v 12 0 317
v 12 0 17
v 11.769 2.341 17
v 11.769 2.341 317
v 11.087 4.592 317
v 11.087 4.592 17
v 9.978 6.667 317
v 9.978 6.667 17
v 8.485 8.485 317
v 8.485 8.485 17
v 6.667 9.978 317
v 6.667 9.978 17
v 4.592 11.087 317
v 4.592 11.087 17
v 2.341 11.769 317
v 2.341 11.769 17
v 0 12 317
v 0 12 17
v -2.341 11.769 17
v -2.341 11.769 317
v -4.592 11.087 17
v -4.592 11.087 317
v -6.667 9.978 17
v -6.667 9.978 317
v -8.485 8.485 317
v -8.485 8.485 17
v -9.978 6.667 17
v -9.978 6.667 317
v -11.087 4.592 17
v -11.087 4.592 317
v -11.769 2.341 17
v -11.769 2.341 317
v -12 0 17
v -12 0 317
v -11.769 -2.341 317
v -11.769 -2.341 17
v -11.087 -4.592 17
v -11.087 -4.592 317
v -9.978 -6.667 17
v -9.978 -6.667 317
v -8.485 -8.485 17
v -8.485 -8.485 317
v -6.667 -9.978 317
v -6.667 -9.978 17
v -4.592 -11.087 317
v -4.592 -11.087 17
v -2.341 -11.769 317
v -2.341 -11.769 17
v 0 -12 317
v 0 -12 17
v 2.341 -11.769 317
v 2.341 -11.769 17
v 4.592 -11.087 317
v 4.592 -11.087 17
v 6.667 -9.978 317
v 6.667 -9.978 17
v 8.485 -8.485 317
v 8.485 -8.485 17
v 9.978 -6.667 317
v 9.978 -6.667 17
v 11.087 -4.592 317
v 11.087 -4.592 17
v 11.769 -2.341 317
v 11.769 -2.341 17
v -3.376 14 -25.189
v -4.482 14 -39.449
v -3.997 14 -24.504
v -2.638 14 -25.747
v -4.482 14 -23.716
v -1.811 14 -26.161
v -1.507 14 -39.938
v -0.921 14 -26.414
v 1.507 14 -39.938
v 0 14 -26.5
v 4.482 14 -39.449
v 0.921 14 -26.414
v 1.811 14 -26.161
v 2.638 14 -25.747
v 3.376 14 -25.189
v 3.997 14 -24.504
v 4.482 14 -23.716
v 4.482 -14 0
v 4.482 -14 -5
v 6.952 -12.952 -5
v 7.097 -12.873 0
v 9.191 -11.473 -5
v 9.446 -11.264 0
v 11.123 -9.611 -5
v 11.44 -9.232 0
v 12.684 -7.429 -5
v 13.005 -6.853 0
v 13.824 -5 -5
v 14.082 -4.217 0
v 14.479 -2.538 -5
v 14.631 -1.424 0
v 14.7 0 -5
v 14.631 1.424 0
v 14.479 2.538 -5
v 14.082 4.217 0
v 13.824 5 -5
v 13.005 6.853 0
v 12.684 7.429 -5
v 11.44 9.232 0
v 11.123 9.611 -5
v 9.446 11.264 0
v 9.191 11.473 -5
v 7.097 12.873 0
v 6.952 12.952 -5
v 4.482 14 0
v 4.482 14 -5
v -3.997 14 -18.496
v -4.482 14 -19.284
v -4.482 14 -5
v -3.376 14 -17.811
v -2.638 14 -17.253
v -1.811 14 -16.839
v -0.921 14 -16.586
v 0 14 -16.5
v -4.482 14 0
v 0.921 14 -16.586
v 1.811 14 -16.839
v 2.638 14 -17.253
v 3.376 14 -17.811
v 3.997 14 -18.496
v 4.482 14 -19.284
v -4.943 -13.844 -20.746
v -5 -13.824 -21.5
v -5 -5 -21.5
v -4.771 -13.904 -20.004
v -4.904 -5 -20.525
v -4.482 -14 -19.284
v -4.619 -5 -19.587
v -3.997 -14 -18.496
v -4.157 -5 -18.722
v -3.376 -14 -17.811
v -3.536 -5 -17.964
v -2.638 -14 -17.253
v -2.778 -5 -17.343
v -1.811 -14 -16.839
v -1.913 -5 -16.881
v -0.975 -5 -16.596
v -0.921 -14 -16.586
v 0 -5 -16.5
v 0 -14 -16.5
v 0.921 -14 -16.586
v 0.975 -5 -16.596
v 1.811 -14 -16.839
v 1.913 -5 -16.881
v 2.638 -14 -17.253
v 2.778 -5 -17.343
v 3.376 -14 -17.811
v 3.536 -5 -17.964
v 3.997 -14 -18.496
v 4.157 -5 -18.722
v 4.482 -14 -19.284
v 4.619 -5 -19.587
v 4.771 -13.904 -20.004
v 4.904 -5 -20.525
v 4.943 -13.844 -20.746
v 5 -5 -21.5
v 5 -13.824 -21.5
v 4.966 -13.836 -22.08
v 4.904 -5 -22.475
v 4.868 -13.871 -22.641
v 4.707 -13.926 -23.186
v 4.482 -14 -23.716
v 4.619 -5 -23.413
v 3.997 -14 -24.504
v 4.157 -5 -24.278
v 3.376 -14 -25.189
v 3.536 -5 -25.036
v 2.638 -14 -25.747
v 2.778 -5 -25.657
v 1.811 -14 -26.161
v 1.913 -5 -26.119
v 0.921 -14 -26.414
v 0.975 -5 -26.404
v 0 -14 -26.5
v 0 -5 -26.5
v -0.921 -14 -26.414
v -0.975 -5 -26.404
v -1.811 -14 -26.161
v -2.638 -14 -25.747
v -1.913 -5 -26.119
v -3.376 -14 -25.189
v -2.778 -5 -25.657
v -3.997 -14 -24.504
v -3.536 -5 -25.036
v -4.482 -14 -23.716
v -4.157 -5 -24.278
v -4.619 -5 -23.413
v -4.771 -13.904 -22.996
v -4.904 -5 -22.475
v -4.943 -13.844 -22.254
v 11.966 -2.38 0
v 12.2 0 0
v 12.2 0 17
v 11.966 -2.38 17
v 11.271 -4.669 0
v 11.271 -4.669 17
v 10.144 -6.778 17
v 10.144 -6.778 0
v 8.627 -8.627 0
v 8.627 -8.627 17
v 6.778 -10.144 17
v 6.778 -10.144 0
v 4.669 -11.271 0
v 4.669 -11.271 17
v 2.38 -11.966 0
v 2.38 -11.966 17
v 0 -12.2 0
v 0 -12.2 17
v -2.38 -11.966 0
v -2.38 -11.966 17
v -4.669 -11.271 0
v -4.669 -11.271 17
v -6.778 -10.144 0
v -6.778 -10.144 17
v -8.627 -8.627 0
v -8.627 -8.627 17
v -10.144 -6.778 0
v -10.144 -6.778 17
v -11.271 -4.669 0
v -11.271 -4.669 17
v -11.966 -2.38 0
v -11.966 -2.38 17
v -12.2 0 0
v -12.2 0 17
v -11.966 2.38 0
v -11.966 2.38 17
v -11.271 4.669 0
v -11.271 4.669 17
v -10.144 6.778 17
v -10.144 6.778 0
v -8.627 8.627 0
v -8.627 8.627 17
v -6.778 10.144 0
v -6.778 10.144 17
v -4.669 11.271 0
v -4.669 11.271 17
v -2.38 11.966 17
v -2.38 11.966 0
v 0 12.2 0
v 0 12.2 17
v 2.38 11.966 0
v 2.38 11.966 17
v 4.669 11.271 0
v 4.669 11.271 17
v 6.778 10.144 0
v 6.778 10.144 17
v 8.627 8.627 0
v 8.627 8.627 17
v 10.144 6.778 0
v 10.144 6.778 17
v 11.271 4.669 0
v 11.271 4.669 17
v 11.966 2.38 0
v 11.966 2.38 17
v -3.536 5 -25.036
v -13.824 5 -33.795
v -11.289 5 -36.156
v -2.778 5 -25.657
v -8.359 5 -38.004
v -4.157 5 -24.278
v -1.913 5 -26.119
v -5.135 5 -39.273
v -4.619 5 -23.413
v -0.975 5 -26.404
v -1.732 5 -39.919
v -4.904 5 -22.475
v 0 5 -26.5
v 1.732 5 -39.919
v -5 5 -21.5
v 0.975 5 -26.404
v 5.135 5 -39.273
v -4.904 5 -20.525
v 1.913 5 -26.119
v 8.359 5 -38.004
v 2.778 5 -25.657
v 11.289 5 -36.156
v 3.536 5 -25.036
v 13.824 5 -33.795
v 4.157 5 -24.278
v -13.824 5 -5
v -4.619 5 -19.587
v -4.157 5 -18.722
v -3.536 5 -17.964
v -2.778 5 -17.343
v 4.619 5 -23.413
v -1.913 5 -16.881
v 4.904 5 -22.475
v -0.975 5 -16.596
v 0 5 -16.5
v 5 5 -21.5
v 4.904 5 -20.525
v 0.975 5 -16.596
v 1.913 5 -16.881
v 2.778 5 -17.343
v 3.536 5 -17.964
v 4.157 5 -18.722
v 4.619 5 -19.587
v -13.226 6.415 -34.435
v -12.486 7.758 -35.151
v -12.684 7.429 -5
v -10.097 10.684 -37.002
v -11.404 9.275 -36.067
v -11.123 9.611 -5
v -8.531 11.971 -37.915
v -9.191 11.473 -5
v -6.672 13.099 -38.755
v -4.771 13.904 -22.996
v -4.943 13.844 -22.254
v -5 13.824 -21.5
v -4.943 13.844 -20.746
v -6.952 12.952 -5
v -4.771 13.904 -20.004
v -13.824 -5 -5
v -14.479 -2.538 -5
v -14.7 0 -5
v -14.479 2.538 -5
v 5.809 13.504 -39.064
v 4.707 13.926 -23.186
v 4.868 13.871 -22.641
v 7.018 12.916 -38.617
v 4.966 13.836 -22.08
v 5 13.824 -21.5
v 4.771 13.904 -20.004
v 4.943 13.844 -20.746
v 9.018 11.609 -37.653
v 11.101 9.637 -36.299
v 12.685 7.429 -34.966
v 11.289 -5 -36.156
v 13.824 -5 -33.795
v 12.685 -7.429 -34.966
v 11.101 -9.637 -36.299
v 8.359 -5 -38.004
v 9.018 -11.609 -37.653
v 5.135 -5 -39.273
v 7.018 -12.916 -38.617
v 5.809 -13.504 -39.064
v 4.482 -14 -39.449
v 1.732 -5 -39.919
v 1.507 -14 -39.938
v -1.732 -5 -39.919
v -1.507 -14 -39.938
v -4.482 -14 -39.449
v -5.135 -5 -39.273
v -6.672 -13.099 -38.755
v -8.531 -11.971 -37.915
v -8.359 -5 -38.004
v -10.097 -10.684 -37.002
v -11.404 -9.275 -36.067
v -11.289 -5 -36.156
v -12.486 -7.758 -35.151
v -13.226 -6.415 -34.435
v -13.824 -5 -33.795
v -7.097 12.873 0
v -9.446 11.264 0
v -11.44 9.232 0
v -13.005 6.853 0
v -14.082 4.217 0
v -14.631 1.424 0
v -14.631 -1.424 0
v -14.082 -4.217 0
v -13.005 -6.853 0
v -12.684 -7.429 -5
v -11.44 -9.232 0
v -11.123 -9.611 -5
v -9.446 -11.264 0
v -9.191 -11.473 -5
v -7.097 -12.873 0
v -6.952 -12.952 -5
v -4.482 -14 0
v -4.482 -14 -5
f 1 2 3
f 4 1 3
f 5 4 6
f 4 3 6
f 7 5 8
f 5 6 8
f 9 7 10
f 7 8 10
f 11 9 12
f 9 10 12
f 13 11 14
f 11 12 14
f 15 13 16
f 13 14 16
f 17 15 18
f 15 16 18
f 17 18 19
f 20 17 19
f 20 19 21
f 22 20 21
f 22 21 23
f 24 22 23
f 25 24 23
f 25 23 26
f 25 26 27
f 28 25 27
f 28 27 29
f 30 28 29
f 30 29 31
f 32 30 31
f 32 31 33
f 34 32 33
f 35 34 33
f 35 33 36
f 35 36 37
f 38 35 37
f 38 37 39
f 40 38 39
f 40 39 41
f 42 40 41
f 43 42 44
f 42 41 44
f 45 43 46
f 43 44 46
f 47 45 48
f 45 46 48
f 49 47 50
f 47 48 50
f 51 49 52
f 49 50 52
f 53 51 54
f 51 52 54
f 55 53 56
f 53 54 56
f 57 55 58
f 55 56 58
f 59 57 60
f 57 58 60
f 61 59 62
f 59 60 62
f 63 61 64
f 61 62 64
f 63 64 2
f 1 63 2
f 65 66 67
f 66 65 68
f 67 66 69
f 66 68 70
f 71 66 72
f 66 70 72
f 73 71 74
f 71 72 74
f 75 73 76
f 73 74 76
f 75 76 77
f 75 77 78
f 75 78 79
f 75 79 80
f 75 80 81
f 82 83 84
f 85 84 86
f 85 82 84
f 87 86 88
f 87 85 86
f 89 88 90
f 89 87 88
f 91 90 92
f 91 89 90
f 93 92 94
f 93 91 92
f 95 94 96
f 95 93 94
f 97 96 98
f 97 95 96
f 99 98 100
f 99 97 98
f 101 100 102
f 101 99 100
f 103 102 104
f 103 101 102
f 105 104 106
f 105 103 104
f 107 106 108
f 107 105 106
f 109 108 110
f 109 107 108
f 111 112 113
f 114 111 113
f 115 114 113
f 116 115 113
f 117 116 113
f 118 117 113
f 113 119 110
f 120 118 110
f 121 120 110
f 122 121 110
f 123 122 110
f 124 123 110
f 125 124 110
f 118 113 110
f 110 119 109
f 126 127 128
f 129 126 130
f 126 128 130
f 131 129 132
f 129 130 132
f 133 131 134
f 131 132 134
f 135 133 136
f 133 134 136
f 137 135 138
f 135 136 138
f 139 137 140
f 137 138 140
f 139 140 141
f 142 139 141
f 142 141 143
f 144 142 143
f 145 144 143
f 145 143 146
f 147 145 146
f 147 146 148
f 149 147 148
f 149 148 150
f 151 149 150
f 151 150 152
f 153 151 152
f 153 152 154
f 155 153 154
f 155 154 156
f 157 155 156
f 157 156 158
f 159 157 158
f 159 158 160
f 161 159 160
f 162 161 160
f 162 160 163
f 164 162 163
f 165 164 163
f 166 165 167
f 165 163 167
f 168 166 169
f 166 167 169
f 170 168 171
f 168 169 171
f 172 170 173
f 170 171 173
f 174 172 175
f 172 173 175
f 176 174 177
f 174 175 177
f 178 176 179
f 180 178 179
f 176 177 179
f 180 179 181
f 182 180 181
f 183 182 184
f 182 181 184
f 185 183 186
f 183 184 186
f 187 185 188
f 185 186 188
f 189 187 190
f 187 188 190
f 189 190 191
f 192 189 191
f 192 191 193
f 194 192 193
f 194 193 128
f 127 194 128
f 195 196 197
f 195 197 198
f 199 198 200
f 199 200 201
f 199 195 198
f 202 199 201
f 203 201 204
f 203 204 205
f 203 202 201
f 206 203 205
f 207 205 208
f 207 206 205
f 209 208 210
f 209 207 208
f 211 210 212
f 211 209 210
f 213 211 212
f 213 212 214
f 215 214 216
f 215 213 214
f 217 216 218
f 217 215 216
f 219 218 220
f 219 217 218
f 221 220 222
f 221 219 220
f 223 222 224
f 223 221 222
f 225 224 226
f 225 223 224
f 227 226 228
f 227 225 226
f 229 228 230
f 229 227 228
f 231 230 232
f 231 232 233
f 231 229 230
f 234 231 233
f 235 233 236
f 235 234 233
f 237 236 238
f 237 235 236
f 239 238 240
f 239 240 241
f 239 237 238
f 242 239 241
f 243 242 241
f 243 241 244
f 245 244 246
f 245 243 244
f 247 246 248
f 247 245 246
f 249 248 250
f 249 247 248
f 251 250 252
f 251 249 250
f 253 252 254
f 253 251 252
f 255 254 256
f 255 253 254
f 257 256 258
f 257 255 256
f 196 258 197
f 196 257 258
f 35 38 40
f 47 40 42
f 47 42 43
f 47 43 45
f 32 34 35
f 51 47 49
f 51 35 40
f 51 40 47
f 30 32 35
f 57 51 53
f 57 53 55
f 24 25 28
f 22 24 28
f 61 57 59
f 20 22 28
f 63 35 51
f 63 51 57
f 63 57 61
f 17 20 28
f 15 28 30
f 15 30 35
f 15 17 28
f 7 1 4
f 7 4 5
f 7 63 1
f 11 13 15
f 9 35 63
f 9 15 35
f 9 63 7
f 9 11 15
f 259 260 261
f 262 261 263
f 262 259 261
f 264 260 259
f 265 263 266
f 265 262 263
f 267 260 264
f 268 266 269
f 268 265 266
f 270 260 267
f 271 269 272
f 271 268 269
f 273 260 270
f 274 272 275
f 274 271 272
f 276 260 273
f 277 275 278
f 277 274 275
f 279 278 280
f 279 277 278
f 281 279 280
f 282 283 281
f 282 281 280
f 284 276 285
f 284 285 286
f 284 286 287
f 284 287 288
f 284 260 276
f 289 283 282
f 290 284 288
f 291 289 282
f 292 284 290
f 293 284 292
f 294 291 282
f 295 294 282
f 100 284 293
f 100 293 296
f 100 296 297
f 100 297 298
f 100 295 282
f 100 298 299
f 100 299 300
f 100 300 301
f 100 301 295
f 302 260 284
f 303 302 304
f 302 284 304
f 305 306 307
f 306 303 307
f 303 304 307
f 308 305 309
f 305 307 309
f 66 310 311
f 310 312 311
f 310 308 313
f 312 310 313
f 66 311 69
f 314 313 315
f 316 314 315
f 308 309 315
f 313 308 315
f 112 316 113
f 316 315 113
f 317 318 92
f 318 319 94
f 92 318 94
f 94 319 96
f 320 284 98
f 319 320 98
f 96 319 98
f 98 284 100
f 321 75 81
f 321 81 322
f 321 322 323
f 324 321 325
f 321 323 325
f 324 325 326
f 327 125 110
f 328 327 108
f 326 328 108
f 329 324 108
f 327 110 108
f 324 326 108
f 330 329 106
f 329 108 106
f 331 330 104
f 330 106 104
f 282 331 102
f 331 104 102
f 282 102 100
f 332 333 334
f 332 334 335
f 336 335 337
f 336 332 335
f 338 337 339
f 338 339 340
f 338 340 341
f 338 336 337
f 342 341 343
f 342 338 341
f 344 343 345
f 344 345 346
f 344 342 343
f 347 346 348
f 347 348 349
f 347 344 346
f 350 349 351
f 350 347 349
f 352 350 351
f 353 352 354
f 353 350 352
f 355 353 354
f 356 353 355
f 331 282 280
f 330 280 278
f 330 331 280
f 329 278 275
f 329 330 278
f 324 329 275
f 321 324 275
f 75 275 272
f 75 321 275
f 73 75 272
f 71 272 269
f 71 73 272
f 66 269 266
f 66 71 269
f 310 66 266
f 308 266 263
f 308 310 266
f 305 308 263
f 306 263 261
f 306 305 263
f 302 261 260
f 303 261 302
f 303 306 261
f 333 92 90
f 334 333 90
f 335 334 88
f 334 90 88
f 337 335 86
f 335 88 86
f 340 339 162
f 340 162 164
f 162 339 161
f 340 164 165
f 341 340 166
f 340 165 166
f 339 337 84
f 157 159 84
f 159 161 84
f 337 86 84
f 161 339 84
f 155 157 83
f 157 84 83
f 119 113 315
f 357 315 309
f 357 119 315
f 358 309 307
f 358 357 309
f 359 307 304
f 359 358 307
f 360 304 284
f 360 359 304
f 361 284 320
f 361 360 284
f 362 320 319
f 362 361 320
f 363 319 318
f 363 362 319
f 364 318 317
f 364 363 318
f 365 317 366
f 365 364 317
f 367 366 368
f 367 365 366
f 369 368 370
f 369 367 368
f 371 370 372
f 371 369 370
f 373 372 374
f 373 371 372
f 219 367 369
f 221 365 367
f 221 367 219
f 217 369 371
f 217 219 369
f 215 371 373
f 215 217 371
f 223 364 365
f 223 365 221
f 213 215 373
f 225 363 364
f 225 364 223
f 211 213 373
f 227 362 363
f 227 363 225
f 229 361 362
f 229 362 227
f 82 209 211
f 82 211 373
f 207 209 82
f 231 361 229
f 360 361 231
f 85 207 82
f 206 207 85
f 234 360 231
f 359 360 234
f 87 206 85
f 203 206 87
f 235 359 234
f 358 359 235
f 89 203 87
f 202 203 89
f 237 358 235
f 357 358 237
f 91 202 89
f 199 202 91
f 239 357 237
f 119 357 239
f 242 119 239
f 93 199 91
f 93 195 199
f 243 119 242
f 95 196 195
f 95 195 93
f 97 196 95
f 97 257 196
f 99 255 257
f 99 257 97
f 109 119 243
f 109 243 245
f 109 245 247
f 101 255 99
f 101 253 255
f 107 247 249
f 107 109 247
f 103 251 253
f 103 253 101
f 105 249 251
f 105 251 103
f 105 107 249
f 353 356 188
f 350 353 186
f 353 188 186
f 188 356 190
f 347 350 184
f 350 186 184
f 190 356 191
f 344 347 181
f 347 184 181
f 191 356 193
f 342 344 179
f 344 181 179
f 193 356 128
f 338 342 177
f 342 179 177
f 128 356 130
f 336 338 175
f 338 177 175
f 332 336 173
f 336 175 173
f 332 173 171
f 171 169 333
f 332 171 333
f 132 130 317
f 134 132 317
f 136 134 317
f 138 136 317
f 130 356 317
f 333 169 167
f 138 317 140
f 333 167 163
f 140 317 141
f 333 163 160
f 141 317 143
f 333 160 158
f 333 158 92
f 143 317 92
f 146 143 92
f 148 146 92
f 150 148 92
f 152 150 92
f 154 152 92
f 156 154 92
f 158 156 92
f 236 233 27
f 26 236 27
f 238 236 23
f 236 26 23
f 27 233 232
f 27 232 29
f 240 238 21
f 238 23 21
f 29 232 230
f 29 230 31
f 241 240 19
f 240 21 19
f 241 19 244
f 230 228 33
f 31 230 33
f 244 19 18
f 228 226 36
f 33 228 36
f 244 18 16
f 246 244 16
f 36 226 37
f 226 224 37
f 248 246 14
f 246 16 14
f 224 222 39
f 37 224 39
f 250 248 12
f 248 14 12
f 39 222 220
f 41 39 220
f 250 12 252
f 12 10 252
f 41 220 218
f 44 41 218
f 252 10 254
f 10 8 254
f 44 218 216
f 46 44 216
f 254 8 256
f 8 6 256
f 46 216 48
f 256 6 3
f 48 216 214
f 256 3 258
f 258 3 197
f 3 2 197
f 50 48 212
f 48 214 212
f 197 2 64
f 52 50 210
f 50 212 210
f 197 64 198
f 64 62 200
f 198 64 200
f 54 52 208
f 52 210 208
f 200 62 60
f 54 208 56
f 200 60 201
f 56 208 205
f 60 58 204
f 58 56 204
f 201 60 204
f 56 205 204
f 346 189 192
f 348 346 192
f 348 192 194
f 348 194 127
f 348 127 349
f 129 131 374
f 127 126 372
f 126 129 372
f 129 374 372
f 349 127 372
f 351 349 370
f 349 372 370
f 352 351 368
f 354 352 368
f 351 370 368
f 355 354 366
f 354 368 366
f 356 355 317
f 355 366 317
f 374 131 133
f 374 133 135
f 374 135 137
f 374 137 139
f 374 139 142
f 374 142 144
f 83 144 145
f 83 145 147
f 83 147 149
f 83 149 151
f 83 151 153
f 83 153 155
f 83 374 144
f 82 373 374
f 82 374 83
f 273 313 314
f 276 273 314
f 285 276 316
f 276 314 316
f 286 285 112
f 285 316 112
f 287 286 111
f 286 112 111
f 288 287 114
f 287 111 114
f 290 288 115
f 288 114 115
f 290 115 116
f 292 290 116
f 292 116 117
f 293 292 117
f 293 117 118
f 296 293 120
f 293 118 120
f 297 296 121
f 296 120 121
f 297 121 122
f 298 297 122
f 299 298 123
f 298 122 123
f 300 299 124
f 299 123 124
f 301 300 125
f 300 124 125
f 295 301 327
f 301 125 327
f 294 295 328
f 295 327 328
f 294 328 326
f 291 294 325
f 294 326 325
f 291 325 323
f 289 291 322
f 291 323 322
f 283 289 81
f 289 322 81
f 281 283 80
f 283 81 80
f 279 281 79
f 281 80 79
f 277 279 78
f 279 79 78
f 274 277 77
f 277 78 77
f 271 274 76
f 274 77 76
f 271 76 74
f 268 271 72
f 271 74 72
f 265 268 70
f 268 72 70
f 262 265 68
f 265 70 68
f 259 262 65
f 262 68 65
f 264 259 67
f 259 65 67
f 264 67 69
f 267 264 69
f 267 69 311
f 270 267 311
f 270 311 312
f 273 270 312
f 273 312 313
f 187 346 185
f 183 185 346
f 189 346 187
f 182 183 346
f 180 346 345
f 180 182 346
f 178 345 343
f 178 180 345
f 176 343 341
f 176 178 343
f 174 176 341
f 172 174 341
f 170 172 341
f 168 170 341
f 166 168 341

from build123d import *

# Parameters (mm, degrees)
SKETCH_R     = 12
PAD_DEPTH    = 317
PAD001_DEPTH = 5
SKETCH004_R  = 12.2
PAD003_DEPTH = 17
PAD004_DEPTH = 36
SKETCH006_R  = 5
POCKET_DEPTH = 28.001


with BuildPart() as part:
    # Sketch → Pad (new body)
    with BuildSketch(Plane.XY):
        Circle(SKETCH_R)
    extrude(amount=PAD_DEPTH)

    # Sketch001 → Pad001 (join)
    with BuildSketch(Plane.XY):
        with BuildLine():
            ThreePointArc((-4.482187, 14), (-14.7, 0), (-4.482187, -14))
            Line((-4.482187, -14), (4.482187, -14))
            ThreePointArc((4.482187, -14), (14.7, 0), (4.482187, 14))
            Line((-4.482187, 14), (4.482187, 14))
        make_face()
    extrude(amount=-PAD001_DEPTH)

    # Sketch004 (on Face2 of Pad) → Pad003 (join)
    with BuildSketch(Plane(origin=(0, 0, 0), x_dir=(1, 0, 0), z_dir=(0, 0, -1))):
        Circle(SKETCH004_R)
    extrude(amount=-PAD003_DEPTH)

    # Sketch005 (on Face5 of Pad003) → Pad004 (join)
    with BuildSketch(Plane(origin=(0, 0, -5), x_dir=(1, 0, 0), z_dir=(0, 0, -1))):
        with BuildLine():
            ThreePointArc((-4.482187, 14), (-10.199256, 10.586084), (-13.823531, 5))
            Line((-13.823531, 5), (13.823531, 5))
            ThreePointArc((13.823531, 5), (10.199256, 10.586084), (4.482187, 14))
            Line((-4.482187, 14), (4.482187, 14))
        make_face()
        with BuildLine():
            Line((-13.823531, -5), (13.823531, -5))
            ThreePointArc((4.482187, -14), (10.199256, -10.586084), (13.823531, -5))
            Line((4.482187, -14), (-4.482187, -14))
            ThreePointArc((-13.823531, -5), (-10.199256, -10.586084), (-4.482187, -14))
        make_face()
    extrude(amount=PAD004_DEPTH)

    # Sketch006 (on Face9 of Pad004) → Pocket (cut, through all)
    with BuildSketch(Plane(origin=(0, 14, 0), x_dir=(-1, 0, 0), z_dir=(0, 1, 0))):
        with Locations((0, -21.5)):
            Circle(SKETCH006_R)
        with BuildLine():
            ThreePointArc((-18.5, -21.5), (0, -40), (18.5, -21.5))
            Line((18.5, -21.5), (18.5, -43))
            Line((-18.5, -43), (18.5, -43))
            Line((-18.5, -21.5), (-18.5, -43))
        make_face()
    extrude(amount=-POCKET_DEPTH, mode=Mode.SUBTRACT)


solid = part.part
